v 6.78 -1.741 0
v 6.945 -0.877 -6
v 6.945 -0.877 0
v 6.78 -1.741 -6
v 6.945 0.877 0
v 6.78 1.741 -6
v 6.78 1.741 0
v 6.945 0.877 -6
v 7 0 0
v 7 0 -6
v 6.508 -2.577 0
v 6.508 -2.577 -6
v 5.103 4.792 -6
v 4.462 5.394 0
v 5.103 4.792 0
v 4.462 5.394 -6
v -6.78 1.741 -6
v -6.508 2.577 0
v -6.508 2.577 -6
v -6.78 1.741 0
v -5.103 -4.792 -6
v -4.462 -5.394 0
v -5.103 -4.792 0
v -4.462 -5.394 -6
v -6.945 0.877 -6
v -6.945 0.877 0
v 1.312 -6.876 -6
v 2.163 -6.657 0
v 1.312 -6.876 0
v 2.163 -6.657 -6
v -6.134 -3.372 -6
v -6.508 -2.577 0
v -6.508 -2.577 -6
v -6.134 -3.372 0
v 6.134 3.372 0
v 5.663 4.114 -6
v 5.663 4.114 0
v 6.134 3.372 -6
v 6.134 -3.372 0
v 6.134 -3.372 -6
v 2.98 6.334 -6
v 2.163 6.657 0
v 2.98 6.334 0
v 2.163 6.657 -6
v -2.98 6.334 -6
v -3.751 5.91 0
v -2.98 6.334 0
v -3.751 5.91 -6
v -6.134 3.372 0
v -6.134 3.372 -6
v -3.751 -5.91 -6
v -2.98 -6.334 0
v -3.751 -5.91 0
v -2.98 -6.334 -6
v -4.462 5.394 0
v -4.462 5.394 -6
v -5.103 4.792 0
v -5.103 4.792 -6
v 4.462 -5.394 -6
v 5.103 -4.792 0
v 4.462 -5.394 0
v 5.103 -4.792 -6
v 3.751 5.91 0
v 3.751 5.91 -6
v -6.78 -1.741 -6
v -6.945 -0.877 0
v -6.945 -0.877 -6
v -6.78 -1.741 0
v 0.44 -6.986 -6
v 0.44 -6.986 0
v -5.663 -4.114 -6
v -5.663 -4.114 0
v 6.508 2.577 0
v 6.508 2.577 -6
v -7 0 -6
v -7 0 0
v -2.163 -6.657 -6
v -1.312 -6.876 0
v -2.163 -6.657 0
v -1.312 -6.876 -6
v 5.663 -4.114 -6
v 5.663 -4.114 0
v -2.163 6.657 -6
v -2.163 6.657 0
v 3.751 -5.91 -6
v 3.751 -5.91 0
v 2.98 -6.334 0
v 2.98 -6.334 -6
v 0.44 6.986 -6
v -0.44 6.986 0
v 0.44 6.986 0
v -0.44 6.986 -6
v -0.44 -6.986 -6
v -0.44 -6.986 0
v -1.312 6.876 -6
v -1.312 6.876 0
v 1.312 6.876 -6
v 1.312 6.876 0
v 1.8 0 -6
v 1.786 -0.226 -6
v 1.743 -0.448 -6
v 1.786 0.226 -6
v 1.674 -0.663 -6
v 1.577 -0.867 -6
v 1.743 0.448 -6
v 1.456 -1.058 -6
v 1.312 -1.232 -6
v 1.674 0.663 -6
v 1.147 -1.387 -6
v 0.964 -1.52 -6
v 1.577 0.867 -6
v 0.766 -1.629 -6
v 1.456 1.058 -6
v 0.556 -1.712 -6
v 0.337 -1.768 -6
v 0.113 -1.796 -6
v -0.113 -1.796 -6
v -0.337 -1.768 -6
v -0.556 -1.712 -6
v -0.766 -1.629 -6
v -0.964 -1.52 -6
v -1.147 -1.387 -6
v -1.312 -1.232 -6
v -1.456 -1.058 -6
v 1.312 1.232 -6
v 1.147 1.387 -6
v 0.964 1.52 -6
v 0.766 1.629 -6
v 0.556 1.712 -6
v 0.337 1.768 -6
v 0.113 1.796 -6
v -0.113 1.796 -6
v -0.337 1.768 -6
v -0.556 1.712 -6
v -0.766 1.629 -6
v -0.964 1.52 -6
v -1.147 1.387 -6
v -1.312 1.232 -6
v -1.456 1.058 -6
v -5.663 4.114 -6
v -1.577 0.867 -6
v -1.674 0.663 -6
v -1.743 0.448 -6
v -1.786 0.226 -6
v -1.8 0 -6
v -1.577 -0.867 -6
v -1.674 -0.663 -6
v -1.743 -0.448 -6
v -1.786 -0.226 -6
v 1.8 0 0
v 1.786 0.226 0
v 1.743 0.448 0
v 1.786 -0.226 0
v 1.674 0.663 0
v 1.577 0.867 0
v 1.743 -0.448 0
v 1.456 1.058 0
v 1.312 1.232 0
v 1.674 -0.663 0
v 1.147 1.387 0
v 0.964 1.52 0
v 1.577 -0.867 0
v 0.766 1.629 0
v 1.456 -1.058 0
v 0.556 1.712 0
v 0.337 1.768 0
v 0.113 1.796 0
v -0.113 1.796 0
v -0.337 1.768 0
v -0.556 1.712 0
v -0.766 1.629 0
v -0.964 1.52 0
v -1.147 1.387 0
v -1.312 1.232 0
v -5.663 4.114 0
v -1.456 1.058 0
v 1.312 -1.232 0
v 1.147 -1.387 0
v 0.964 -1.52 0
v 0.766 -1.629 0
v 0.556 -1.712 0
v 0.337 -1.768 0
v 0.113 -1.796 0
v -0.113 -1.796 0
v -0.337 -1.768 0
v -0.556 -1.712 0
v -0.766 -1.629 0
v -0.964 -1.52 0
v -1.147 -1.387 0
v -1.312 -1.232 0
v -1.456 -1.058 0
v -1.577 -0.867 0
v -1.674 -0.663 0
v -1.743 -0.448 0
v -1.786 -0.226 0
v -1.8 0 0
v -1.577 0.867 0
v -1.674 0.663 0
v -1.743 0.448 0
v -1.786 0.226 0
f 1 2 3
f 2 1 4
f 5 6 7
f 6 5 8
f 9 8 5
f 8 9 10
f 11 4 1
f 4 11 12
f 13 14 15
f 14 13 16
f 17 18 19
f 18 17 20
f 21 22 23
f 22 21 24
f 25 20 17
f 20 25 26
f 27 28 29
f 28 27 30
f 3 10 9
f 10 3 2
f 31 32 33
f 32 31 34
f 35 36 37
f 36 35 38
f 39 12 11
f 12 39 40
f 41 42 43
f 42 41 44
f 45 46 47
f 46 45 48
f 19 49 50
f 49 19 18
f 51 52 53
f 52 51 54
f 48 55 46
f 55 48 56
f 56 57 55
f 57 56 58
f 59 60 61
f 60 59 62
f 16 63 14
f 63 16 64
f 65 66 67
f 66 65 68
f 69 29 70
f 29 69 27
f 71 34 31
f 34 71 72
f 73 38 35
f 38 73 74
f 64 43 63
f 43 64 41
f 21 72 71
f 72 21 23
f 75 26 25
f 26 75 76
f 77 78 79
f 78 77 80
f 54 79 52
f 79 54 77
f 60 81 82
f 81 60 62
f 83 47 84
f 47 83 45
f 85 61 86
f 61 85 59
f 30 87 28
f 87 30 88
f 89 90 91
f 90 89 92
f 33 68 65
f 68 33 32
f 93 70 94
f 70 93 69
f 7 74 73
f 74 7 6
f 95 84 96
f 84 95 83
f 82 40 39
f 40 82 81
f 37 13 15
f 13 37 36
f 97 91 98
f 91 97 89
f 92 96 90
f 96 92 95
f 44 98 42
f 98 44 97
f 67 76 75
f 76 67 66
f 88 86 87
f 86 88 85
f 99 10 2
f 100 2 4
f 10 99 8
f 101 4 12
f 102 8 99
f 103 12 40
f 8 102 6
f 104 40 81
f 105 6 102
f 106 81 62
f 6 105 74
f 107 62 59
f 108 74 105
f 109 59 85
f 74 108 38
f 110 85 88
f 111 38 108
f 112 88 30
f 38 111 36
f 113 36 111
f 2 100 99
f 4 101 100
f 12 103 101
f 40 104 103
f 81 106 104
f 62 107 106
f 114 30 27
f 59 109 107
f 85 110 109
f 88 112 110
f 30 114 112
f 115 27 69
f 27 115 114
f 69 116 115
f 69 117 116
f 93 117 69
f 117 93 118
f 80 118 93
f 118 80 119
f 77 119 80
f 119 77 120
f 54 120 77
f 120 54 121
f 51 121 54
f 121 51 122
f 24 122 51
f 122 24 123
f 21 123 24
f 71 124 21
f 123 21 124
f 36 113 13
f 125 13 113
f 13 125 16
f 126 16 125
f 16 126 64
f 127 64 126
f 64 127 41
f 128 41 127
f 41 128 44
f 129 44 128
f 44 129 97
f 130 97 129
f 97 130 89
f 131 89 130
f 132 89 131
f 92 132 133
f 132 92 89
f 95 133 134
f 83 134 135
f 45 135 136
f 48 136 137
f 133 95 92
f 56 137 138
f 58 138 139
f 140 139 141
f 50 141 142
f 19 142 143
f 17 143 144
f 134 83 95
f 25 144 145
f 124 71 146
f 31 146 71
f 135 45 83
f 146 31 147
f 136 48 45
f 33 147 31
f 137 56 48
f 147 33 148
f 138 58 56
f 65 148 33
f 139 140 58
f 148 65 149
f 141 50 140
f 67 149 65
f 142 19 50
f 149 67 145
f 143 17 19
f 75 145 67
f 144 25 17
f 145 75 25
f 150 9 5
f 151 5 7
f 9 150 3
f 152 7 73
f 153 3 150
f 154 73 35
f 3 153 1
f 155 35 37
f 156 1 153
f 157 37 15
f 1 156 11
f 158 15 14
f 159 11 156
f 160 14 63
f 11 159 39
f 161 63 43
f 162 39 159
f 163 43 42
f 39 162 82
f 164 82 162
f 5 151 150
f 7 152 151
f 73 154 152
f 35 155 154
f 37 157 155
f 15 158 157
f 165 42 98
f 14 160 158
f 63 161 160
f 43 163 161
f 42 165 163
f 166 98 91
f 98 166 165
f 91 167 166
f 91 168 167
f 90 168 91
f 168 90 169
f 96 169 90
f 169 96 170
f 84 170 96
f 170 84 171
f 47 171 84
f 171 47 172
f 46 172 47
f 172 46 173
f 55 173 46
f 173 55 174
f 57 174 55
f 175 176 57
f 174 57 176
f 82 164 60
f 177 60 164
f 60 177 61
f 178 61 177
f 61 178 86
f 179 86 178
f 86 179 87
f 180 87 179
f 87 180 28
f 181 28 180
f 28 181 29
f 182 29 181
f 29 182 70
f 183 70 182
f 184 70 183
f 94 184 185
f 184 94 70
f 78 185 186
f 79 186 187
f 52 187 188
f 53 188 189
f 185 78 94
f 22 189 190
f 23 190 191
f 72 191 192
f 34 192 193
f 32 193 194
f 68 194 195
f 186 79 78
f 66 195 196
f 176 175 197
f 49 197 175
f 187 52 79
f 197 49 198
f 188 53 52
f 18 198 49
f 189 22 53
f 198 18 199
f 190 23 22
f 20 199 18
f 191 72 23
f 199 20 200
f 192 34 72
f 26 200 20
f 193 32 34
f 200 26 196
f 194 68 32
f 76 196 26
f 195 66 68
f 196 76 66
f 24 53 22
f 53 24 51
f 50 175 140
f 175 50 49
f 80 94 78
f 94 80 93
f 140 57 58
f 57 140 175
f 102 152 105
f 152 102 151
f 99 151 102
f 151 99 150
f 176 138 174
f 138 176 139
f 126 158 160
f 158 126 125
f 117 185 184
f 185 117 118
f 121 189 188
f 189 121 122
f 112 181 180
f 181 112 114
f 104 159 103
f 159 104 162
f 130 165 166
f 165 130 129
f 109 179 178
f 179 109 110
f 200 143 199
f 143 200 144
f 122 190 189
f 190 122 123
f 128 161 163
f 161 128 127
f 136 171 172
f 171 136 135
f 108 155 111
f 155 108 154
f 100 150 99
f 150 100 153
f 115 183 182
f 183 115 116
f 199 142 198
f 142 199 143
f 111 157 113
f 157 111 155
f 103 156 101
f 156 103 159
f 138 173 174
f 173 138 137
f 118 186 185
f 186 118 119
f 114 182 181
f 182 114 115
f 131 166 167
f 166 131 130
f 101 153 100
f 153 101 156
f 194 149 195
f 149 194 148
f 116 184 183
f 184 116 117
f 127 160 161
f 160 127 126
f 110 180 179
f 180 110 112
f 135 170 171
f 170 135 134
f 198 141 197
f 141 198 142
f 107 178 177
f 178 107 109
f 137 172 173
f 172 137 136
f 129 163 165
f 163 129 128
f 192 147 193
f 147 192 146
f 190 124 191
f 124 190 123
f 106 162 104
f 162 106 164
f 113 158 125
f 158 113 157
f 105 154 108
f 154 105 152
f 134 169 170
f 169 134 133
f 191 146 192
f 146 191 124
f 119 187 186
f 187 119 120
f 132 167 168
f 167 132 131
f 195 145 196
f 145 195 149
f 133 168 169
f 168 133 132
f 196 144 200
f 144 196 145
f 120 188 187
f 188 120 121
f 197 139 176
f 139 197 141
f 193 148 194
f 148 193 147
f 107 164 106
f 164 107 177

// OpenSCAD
$fn = 50;


difference() {
	union() {
		translate(v = [0, 0, -6.0000000000]) {
			cylinder(h = 6, r = 7.0000000000);
		}
		cylinder(h = 0, r = 17.0000000000);
	}
	union() {
		#translate(v = [0, 0, -6]) {
			cylinder(h = 6, r = 1.8000000000);
		}
	}
}
